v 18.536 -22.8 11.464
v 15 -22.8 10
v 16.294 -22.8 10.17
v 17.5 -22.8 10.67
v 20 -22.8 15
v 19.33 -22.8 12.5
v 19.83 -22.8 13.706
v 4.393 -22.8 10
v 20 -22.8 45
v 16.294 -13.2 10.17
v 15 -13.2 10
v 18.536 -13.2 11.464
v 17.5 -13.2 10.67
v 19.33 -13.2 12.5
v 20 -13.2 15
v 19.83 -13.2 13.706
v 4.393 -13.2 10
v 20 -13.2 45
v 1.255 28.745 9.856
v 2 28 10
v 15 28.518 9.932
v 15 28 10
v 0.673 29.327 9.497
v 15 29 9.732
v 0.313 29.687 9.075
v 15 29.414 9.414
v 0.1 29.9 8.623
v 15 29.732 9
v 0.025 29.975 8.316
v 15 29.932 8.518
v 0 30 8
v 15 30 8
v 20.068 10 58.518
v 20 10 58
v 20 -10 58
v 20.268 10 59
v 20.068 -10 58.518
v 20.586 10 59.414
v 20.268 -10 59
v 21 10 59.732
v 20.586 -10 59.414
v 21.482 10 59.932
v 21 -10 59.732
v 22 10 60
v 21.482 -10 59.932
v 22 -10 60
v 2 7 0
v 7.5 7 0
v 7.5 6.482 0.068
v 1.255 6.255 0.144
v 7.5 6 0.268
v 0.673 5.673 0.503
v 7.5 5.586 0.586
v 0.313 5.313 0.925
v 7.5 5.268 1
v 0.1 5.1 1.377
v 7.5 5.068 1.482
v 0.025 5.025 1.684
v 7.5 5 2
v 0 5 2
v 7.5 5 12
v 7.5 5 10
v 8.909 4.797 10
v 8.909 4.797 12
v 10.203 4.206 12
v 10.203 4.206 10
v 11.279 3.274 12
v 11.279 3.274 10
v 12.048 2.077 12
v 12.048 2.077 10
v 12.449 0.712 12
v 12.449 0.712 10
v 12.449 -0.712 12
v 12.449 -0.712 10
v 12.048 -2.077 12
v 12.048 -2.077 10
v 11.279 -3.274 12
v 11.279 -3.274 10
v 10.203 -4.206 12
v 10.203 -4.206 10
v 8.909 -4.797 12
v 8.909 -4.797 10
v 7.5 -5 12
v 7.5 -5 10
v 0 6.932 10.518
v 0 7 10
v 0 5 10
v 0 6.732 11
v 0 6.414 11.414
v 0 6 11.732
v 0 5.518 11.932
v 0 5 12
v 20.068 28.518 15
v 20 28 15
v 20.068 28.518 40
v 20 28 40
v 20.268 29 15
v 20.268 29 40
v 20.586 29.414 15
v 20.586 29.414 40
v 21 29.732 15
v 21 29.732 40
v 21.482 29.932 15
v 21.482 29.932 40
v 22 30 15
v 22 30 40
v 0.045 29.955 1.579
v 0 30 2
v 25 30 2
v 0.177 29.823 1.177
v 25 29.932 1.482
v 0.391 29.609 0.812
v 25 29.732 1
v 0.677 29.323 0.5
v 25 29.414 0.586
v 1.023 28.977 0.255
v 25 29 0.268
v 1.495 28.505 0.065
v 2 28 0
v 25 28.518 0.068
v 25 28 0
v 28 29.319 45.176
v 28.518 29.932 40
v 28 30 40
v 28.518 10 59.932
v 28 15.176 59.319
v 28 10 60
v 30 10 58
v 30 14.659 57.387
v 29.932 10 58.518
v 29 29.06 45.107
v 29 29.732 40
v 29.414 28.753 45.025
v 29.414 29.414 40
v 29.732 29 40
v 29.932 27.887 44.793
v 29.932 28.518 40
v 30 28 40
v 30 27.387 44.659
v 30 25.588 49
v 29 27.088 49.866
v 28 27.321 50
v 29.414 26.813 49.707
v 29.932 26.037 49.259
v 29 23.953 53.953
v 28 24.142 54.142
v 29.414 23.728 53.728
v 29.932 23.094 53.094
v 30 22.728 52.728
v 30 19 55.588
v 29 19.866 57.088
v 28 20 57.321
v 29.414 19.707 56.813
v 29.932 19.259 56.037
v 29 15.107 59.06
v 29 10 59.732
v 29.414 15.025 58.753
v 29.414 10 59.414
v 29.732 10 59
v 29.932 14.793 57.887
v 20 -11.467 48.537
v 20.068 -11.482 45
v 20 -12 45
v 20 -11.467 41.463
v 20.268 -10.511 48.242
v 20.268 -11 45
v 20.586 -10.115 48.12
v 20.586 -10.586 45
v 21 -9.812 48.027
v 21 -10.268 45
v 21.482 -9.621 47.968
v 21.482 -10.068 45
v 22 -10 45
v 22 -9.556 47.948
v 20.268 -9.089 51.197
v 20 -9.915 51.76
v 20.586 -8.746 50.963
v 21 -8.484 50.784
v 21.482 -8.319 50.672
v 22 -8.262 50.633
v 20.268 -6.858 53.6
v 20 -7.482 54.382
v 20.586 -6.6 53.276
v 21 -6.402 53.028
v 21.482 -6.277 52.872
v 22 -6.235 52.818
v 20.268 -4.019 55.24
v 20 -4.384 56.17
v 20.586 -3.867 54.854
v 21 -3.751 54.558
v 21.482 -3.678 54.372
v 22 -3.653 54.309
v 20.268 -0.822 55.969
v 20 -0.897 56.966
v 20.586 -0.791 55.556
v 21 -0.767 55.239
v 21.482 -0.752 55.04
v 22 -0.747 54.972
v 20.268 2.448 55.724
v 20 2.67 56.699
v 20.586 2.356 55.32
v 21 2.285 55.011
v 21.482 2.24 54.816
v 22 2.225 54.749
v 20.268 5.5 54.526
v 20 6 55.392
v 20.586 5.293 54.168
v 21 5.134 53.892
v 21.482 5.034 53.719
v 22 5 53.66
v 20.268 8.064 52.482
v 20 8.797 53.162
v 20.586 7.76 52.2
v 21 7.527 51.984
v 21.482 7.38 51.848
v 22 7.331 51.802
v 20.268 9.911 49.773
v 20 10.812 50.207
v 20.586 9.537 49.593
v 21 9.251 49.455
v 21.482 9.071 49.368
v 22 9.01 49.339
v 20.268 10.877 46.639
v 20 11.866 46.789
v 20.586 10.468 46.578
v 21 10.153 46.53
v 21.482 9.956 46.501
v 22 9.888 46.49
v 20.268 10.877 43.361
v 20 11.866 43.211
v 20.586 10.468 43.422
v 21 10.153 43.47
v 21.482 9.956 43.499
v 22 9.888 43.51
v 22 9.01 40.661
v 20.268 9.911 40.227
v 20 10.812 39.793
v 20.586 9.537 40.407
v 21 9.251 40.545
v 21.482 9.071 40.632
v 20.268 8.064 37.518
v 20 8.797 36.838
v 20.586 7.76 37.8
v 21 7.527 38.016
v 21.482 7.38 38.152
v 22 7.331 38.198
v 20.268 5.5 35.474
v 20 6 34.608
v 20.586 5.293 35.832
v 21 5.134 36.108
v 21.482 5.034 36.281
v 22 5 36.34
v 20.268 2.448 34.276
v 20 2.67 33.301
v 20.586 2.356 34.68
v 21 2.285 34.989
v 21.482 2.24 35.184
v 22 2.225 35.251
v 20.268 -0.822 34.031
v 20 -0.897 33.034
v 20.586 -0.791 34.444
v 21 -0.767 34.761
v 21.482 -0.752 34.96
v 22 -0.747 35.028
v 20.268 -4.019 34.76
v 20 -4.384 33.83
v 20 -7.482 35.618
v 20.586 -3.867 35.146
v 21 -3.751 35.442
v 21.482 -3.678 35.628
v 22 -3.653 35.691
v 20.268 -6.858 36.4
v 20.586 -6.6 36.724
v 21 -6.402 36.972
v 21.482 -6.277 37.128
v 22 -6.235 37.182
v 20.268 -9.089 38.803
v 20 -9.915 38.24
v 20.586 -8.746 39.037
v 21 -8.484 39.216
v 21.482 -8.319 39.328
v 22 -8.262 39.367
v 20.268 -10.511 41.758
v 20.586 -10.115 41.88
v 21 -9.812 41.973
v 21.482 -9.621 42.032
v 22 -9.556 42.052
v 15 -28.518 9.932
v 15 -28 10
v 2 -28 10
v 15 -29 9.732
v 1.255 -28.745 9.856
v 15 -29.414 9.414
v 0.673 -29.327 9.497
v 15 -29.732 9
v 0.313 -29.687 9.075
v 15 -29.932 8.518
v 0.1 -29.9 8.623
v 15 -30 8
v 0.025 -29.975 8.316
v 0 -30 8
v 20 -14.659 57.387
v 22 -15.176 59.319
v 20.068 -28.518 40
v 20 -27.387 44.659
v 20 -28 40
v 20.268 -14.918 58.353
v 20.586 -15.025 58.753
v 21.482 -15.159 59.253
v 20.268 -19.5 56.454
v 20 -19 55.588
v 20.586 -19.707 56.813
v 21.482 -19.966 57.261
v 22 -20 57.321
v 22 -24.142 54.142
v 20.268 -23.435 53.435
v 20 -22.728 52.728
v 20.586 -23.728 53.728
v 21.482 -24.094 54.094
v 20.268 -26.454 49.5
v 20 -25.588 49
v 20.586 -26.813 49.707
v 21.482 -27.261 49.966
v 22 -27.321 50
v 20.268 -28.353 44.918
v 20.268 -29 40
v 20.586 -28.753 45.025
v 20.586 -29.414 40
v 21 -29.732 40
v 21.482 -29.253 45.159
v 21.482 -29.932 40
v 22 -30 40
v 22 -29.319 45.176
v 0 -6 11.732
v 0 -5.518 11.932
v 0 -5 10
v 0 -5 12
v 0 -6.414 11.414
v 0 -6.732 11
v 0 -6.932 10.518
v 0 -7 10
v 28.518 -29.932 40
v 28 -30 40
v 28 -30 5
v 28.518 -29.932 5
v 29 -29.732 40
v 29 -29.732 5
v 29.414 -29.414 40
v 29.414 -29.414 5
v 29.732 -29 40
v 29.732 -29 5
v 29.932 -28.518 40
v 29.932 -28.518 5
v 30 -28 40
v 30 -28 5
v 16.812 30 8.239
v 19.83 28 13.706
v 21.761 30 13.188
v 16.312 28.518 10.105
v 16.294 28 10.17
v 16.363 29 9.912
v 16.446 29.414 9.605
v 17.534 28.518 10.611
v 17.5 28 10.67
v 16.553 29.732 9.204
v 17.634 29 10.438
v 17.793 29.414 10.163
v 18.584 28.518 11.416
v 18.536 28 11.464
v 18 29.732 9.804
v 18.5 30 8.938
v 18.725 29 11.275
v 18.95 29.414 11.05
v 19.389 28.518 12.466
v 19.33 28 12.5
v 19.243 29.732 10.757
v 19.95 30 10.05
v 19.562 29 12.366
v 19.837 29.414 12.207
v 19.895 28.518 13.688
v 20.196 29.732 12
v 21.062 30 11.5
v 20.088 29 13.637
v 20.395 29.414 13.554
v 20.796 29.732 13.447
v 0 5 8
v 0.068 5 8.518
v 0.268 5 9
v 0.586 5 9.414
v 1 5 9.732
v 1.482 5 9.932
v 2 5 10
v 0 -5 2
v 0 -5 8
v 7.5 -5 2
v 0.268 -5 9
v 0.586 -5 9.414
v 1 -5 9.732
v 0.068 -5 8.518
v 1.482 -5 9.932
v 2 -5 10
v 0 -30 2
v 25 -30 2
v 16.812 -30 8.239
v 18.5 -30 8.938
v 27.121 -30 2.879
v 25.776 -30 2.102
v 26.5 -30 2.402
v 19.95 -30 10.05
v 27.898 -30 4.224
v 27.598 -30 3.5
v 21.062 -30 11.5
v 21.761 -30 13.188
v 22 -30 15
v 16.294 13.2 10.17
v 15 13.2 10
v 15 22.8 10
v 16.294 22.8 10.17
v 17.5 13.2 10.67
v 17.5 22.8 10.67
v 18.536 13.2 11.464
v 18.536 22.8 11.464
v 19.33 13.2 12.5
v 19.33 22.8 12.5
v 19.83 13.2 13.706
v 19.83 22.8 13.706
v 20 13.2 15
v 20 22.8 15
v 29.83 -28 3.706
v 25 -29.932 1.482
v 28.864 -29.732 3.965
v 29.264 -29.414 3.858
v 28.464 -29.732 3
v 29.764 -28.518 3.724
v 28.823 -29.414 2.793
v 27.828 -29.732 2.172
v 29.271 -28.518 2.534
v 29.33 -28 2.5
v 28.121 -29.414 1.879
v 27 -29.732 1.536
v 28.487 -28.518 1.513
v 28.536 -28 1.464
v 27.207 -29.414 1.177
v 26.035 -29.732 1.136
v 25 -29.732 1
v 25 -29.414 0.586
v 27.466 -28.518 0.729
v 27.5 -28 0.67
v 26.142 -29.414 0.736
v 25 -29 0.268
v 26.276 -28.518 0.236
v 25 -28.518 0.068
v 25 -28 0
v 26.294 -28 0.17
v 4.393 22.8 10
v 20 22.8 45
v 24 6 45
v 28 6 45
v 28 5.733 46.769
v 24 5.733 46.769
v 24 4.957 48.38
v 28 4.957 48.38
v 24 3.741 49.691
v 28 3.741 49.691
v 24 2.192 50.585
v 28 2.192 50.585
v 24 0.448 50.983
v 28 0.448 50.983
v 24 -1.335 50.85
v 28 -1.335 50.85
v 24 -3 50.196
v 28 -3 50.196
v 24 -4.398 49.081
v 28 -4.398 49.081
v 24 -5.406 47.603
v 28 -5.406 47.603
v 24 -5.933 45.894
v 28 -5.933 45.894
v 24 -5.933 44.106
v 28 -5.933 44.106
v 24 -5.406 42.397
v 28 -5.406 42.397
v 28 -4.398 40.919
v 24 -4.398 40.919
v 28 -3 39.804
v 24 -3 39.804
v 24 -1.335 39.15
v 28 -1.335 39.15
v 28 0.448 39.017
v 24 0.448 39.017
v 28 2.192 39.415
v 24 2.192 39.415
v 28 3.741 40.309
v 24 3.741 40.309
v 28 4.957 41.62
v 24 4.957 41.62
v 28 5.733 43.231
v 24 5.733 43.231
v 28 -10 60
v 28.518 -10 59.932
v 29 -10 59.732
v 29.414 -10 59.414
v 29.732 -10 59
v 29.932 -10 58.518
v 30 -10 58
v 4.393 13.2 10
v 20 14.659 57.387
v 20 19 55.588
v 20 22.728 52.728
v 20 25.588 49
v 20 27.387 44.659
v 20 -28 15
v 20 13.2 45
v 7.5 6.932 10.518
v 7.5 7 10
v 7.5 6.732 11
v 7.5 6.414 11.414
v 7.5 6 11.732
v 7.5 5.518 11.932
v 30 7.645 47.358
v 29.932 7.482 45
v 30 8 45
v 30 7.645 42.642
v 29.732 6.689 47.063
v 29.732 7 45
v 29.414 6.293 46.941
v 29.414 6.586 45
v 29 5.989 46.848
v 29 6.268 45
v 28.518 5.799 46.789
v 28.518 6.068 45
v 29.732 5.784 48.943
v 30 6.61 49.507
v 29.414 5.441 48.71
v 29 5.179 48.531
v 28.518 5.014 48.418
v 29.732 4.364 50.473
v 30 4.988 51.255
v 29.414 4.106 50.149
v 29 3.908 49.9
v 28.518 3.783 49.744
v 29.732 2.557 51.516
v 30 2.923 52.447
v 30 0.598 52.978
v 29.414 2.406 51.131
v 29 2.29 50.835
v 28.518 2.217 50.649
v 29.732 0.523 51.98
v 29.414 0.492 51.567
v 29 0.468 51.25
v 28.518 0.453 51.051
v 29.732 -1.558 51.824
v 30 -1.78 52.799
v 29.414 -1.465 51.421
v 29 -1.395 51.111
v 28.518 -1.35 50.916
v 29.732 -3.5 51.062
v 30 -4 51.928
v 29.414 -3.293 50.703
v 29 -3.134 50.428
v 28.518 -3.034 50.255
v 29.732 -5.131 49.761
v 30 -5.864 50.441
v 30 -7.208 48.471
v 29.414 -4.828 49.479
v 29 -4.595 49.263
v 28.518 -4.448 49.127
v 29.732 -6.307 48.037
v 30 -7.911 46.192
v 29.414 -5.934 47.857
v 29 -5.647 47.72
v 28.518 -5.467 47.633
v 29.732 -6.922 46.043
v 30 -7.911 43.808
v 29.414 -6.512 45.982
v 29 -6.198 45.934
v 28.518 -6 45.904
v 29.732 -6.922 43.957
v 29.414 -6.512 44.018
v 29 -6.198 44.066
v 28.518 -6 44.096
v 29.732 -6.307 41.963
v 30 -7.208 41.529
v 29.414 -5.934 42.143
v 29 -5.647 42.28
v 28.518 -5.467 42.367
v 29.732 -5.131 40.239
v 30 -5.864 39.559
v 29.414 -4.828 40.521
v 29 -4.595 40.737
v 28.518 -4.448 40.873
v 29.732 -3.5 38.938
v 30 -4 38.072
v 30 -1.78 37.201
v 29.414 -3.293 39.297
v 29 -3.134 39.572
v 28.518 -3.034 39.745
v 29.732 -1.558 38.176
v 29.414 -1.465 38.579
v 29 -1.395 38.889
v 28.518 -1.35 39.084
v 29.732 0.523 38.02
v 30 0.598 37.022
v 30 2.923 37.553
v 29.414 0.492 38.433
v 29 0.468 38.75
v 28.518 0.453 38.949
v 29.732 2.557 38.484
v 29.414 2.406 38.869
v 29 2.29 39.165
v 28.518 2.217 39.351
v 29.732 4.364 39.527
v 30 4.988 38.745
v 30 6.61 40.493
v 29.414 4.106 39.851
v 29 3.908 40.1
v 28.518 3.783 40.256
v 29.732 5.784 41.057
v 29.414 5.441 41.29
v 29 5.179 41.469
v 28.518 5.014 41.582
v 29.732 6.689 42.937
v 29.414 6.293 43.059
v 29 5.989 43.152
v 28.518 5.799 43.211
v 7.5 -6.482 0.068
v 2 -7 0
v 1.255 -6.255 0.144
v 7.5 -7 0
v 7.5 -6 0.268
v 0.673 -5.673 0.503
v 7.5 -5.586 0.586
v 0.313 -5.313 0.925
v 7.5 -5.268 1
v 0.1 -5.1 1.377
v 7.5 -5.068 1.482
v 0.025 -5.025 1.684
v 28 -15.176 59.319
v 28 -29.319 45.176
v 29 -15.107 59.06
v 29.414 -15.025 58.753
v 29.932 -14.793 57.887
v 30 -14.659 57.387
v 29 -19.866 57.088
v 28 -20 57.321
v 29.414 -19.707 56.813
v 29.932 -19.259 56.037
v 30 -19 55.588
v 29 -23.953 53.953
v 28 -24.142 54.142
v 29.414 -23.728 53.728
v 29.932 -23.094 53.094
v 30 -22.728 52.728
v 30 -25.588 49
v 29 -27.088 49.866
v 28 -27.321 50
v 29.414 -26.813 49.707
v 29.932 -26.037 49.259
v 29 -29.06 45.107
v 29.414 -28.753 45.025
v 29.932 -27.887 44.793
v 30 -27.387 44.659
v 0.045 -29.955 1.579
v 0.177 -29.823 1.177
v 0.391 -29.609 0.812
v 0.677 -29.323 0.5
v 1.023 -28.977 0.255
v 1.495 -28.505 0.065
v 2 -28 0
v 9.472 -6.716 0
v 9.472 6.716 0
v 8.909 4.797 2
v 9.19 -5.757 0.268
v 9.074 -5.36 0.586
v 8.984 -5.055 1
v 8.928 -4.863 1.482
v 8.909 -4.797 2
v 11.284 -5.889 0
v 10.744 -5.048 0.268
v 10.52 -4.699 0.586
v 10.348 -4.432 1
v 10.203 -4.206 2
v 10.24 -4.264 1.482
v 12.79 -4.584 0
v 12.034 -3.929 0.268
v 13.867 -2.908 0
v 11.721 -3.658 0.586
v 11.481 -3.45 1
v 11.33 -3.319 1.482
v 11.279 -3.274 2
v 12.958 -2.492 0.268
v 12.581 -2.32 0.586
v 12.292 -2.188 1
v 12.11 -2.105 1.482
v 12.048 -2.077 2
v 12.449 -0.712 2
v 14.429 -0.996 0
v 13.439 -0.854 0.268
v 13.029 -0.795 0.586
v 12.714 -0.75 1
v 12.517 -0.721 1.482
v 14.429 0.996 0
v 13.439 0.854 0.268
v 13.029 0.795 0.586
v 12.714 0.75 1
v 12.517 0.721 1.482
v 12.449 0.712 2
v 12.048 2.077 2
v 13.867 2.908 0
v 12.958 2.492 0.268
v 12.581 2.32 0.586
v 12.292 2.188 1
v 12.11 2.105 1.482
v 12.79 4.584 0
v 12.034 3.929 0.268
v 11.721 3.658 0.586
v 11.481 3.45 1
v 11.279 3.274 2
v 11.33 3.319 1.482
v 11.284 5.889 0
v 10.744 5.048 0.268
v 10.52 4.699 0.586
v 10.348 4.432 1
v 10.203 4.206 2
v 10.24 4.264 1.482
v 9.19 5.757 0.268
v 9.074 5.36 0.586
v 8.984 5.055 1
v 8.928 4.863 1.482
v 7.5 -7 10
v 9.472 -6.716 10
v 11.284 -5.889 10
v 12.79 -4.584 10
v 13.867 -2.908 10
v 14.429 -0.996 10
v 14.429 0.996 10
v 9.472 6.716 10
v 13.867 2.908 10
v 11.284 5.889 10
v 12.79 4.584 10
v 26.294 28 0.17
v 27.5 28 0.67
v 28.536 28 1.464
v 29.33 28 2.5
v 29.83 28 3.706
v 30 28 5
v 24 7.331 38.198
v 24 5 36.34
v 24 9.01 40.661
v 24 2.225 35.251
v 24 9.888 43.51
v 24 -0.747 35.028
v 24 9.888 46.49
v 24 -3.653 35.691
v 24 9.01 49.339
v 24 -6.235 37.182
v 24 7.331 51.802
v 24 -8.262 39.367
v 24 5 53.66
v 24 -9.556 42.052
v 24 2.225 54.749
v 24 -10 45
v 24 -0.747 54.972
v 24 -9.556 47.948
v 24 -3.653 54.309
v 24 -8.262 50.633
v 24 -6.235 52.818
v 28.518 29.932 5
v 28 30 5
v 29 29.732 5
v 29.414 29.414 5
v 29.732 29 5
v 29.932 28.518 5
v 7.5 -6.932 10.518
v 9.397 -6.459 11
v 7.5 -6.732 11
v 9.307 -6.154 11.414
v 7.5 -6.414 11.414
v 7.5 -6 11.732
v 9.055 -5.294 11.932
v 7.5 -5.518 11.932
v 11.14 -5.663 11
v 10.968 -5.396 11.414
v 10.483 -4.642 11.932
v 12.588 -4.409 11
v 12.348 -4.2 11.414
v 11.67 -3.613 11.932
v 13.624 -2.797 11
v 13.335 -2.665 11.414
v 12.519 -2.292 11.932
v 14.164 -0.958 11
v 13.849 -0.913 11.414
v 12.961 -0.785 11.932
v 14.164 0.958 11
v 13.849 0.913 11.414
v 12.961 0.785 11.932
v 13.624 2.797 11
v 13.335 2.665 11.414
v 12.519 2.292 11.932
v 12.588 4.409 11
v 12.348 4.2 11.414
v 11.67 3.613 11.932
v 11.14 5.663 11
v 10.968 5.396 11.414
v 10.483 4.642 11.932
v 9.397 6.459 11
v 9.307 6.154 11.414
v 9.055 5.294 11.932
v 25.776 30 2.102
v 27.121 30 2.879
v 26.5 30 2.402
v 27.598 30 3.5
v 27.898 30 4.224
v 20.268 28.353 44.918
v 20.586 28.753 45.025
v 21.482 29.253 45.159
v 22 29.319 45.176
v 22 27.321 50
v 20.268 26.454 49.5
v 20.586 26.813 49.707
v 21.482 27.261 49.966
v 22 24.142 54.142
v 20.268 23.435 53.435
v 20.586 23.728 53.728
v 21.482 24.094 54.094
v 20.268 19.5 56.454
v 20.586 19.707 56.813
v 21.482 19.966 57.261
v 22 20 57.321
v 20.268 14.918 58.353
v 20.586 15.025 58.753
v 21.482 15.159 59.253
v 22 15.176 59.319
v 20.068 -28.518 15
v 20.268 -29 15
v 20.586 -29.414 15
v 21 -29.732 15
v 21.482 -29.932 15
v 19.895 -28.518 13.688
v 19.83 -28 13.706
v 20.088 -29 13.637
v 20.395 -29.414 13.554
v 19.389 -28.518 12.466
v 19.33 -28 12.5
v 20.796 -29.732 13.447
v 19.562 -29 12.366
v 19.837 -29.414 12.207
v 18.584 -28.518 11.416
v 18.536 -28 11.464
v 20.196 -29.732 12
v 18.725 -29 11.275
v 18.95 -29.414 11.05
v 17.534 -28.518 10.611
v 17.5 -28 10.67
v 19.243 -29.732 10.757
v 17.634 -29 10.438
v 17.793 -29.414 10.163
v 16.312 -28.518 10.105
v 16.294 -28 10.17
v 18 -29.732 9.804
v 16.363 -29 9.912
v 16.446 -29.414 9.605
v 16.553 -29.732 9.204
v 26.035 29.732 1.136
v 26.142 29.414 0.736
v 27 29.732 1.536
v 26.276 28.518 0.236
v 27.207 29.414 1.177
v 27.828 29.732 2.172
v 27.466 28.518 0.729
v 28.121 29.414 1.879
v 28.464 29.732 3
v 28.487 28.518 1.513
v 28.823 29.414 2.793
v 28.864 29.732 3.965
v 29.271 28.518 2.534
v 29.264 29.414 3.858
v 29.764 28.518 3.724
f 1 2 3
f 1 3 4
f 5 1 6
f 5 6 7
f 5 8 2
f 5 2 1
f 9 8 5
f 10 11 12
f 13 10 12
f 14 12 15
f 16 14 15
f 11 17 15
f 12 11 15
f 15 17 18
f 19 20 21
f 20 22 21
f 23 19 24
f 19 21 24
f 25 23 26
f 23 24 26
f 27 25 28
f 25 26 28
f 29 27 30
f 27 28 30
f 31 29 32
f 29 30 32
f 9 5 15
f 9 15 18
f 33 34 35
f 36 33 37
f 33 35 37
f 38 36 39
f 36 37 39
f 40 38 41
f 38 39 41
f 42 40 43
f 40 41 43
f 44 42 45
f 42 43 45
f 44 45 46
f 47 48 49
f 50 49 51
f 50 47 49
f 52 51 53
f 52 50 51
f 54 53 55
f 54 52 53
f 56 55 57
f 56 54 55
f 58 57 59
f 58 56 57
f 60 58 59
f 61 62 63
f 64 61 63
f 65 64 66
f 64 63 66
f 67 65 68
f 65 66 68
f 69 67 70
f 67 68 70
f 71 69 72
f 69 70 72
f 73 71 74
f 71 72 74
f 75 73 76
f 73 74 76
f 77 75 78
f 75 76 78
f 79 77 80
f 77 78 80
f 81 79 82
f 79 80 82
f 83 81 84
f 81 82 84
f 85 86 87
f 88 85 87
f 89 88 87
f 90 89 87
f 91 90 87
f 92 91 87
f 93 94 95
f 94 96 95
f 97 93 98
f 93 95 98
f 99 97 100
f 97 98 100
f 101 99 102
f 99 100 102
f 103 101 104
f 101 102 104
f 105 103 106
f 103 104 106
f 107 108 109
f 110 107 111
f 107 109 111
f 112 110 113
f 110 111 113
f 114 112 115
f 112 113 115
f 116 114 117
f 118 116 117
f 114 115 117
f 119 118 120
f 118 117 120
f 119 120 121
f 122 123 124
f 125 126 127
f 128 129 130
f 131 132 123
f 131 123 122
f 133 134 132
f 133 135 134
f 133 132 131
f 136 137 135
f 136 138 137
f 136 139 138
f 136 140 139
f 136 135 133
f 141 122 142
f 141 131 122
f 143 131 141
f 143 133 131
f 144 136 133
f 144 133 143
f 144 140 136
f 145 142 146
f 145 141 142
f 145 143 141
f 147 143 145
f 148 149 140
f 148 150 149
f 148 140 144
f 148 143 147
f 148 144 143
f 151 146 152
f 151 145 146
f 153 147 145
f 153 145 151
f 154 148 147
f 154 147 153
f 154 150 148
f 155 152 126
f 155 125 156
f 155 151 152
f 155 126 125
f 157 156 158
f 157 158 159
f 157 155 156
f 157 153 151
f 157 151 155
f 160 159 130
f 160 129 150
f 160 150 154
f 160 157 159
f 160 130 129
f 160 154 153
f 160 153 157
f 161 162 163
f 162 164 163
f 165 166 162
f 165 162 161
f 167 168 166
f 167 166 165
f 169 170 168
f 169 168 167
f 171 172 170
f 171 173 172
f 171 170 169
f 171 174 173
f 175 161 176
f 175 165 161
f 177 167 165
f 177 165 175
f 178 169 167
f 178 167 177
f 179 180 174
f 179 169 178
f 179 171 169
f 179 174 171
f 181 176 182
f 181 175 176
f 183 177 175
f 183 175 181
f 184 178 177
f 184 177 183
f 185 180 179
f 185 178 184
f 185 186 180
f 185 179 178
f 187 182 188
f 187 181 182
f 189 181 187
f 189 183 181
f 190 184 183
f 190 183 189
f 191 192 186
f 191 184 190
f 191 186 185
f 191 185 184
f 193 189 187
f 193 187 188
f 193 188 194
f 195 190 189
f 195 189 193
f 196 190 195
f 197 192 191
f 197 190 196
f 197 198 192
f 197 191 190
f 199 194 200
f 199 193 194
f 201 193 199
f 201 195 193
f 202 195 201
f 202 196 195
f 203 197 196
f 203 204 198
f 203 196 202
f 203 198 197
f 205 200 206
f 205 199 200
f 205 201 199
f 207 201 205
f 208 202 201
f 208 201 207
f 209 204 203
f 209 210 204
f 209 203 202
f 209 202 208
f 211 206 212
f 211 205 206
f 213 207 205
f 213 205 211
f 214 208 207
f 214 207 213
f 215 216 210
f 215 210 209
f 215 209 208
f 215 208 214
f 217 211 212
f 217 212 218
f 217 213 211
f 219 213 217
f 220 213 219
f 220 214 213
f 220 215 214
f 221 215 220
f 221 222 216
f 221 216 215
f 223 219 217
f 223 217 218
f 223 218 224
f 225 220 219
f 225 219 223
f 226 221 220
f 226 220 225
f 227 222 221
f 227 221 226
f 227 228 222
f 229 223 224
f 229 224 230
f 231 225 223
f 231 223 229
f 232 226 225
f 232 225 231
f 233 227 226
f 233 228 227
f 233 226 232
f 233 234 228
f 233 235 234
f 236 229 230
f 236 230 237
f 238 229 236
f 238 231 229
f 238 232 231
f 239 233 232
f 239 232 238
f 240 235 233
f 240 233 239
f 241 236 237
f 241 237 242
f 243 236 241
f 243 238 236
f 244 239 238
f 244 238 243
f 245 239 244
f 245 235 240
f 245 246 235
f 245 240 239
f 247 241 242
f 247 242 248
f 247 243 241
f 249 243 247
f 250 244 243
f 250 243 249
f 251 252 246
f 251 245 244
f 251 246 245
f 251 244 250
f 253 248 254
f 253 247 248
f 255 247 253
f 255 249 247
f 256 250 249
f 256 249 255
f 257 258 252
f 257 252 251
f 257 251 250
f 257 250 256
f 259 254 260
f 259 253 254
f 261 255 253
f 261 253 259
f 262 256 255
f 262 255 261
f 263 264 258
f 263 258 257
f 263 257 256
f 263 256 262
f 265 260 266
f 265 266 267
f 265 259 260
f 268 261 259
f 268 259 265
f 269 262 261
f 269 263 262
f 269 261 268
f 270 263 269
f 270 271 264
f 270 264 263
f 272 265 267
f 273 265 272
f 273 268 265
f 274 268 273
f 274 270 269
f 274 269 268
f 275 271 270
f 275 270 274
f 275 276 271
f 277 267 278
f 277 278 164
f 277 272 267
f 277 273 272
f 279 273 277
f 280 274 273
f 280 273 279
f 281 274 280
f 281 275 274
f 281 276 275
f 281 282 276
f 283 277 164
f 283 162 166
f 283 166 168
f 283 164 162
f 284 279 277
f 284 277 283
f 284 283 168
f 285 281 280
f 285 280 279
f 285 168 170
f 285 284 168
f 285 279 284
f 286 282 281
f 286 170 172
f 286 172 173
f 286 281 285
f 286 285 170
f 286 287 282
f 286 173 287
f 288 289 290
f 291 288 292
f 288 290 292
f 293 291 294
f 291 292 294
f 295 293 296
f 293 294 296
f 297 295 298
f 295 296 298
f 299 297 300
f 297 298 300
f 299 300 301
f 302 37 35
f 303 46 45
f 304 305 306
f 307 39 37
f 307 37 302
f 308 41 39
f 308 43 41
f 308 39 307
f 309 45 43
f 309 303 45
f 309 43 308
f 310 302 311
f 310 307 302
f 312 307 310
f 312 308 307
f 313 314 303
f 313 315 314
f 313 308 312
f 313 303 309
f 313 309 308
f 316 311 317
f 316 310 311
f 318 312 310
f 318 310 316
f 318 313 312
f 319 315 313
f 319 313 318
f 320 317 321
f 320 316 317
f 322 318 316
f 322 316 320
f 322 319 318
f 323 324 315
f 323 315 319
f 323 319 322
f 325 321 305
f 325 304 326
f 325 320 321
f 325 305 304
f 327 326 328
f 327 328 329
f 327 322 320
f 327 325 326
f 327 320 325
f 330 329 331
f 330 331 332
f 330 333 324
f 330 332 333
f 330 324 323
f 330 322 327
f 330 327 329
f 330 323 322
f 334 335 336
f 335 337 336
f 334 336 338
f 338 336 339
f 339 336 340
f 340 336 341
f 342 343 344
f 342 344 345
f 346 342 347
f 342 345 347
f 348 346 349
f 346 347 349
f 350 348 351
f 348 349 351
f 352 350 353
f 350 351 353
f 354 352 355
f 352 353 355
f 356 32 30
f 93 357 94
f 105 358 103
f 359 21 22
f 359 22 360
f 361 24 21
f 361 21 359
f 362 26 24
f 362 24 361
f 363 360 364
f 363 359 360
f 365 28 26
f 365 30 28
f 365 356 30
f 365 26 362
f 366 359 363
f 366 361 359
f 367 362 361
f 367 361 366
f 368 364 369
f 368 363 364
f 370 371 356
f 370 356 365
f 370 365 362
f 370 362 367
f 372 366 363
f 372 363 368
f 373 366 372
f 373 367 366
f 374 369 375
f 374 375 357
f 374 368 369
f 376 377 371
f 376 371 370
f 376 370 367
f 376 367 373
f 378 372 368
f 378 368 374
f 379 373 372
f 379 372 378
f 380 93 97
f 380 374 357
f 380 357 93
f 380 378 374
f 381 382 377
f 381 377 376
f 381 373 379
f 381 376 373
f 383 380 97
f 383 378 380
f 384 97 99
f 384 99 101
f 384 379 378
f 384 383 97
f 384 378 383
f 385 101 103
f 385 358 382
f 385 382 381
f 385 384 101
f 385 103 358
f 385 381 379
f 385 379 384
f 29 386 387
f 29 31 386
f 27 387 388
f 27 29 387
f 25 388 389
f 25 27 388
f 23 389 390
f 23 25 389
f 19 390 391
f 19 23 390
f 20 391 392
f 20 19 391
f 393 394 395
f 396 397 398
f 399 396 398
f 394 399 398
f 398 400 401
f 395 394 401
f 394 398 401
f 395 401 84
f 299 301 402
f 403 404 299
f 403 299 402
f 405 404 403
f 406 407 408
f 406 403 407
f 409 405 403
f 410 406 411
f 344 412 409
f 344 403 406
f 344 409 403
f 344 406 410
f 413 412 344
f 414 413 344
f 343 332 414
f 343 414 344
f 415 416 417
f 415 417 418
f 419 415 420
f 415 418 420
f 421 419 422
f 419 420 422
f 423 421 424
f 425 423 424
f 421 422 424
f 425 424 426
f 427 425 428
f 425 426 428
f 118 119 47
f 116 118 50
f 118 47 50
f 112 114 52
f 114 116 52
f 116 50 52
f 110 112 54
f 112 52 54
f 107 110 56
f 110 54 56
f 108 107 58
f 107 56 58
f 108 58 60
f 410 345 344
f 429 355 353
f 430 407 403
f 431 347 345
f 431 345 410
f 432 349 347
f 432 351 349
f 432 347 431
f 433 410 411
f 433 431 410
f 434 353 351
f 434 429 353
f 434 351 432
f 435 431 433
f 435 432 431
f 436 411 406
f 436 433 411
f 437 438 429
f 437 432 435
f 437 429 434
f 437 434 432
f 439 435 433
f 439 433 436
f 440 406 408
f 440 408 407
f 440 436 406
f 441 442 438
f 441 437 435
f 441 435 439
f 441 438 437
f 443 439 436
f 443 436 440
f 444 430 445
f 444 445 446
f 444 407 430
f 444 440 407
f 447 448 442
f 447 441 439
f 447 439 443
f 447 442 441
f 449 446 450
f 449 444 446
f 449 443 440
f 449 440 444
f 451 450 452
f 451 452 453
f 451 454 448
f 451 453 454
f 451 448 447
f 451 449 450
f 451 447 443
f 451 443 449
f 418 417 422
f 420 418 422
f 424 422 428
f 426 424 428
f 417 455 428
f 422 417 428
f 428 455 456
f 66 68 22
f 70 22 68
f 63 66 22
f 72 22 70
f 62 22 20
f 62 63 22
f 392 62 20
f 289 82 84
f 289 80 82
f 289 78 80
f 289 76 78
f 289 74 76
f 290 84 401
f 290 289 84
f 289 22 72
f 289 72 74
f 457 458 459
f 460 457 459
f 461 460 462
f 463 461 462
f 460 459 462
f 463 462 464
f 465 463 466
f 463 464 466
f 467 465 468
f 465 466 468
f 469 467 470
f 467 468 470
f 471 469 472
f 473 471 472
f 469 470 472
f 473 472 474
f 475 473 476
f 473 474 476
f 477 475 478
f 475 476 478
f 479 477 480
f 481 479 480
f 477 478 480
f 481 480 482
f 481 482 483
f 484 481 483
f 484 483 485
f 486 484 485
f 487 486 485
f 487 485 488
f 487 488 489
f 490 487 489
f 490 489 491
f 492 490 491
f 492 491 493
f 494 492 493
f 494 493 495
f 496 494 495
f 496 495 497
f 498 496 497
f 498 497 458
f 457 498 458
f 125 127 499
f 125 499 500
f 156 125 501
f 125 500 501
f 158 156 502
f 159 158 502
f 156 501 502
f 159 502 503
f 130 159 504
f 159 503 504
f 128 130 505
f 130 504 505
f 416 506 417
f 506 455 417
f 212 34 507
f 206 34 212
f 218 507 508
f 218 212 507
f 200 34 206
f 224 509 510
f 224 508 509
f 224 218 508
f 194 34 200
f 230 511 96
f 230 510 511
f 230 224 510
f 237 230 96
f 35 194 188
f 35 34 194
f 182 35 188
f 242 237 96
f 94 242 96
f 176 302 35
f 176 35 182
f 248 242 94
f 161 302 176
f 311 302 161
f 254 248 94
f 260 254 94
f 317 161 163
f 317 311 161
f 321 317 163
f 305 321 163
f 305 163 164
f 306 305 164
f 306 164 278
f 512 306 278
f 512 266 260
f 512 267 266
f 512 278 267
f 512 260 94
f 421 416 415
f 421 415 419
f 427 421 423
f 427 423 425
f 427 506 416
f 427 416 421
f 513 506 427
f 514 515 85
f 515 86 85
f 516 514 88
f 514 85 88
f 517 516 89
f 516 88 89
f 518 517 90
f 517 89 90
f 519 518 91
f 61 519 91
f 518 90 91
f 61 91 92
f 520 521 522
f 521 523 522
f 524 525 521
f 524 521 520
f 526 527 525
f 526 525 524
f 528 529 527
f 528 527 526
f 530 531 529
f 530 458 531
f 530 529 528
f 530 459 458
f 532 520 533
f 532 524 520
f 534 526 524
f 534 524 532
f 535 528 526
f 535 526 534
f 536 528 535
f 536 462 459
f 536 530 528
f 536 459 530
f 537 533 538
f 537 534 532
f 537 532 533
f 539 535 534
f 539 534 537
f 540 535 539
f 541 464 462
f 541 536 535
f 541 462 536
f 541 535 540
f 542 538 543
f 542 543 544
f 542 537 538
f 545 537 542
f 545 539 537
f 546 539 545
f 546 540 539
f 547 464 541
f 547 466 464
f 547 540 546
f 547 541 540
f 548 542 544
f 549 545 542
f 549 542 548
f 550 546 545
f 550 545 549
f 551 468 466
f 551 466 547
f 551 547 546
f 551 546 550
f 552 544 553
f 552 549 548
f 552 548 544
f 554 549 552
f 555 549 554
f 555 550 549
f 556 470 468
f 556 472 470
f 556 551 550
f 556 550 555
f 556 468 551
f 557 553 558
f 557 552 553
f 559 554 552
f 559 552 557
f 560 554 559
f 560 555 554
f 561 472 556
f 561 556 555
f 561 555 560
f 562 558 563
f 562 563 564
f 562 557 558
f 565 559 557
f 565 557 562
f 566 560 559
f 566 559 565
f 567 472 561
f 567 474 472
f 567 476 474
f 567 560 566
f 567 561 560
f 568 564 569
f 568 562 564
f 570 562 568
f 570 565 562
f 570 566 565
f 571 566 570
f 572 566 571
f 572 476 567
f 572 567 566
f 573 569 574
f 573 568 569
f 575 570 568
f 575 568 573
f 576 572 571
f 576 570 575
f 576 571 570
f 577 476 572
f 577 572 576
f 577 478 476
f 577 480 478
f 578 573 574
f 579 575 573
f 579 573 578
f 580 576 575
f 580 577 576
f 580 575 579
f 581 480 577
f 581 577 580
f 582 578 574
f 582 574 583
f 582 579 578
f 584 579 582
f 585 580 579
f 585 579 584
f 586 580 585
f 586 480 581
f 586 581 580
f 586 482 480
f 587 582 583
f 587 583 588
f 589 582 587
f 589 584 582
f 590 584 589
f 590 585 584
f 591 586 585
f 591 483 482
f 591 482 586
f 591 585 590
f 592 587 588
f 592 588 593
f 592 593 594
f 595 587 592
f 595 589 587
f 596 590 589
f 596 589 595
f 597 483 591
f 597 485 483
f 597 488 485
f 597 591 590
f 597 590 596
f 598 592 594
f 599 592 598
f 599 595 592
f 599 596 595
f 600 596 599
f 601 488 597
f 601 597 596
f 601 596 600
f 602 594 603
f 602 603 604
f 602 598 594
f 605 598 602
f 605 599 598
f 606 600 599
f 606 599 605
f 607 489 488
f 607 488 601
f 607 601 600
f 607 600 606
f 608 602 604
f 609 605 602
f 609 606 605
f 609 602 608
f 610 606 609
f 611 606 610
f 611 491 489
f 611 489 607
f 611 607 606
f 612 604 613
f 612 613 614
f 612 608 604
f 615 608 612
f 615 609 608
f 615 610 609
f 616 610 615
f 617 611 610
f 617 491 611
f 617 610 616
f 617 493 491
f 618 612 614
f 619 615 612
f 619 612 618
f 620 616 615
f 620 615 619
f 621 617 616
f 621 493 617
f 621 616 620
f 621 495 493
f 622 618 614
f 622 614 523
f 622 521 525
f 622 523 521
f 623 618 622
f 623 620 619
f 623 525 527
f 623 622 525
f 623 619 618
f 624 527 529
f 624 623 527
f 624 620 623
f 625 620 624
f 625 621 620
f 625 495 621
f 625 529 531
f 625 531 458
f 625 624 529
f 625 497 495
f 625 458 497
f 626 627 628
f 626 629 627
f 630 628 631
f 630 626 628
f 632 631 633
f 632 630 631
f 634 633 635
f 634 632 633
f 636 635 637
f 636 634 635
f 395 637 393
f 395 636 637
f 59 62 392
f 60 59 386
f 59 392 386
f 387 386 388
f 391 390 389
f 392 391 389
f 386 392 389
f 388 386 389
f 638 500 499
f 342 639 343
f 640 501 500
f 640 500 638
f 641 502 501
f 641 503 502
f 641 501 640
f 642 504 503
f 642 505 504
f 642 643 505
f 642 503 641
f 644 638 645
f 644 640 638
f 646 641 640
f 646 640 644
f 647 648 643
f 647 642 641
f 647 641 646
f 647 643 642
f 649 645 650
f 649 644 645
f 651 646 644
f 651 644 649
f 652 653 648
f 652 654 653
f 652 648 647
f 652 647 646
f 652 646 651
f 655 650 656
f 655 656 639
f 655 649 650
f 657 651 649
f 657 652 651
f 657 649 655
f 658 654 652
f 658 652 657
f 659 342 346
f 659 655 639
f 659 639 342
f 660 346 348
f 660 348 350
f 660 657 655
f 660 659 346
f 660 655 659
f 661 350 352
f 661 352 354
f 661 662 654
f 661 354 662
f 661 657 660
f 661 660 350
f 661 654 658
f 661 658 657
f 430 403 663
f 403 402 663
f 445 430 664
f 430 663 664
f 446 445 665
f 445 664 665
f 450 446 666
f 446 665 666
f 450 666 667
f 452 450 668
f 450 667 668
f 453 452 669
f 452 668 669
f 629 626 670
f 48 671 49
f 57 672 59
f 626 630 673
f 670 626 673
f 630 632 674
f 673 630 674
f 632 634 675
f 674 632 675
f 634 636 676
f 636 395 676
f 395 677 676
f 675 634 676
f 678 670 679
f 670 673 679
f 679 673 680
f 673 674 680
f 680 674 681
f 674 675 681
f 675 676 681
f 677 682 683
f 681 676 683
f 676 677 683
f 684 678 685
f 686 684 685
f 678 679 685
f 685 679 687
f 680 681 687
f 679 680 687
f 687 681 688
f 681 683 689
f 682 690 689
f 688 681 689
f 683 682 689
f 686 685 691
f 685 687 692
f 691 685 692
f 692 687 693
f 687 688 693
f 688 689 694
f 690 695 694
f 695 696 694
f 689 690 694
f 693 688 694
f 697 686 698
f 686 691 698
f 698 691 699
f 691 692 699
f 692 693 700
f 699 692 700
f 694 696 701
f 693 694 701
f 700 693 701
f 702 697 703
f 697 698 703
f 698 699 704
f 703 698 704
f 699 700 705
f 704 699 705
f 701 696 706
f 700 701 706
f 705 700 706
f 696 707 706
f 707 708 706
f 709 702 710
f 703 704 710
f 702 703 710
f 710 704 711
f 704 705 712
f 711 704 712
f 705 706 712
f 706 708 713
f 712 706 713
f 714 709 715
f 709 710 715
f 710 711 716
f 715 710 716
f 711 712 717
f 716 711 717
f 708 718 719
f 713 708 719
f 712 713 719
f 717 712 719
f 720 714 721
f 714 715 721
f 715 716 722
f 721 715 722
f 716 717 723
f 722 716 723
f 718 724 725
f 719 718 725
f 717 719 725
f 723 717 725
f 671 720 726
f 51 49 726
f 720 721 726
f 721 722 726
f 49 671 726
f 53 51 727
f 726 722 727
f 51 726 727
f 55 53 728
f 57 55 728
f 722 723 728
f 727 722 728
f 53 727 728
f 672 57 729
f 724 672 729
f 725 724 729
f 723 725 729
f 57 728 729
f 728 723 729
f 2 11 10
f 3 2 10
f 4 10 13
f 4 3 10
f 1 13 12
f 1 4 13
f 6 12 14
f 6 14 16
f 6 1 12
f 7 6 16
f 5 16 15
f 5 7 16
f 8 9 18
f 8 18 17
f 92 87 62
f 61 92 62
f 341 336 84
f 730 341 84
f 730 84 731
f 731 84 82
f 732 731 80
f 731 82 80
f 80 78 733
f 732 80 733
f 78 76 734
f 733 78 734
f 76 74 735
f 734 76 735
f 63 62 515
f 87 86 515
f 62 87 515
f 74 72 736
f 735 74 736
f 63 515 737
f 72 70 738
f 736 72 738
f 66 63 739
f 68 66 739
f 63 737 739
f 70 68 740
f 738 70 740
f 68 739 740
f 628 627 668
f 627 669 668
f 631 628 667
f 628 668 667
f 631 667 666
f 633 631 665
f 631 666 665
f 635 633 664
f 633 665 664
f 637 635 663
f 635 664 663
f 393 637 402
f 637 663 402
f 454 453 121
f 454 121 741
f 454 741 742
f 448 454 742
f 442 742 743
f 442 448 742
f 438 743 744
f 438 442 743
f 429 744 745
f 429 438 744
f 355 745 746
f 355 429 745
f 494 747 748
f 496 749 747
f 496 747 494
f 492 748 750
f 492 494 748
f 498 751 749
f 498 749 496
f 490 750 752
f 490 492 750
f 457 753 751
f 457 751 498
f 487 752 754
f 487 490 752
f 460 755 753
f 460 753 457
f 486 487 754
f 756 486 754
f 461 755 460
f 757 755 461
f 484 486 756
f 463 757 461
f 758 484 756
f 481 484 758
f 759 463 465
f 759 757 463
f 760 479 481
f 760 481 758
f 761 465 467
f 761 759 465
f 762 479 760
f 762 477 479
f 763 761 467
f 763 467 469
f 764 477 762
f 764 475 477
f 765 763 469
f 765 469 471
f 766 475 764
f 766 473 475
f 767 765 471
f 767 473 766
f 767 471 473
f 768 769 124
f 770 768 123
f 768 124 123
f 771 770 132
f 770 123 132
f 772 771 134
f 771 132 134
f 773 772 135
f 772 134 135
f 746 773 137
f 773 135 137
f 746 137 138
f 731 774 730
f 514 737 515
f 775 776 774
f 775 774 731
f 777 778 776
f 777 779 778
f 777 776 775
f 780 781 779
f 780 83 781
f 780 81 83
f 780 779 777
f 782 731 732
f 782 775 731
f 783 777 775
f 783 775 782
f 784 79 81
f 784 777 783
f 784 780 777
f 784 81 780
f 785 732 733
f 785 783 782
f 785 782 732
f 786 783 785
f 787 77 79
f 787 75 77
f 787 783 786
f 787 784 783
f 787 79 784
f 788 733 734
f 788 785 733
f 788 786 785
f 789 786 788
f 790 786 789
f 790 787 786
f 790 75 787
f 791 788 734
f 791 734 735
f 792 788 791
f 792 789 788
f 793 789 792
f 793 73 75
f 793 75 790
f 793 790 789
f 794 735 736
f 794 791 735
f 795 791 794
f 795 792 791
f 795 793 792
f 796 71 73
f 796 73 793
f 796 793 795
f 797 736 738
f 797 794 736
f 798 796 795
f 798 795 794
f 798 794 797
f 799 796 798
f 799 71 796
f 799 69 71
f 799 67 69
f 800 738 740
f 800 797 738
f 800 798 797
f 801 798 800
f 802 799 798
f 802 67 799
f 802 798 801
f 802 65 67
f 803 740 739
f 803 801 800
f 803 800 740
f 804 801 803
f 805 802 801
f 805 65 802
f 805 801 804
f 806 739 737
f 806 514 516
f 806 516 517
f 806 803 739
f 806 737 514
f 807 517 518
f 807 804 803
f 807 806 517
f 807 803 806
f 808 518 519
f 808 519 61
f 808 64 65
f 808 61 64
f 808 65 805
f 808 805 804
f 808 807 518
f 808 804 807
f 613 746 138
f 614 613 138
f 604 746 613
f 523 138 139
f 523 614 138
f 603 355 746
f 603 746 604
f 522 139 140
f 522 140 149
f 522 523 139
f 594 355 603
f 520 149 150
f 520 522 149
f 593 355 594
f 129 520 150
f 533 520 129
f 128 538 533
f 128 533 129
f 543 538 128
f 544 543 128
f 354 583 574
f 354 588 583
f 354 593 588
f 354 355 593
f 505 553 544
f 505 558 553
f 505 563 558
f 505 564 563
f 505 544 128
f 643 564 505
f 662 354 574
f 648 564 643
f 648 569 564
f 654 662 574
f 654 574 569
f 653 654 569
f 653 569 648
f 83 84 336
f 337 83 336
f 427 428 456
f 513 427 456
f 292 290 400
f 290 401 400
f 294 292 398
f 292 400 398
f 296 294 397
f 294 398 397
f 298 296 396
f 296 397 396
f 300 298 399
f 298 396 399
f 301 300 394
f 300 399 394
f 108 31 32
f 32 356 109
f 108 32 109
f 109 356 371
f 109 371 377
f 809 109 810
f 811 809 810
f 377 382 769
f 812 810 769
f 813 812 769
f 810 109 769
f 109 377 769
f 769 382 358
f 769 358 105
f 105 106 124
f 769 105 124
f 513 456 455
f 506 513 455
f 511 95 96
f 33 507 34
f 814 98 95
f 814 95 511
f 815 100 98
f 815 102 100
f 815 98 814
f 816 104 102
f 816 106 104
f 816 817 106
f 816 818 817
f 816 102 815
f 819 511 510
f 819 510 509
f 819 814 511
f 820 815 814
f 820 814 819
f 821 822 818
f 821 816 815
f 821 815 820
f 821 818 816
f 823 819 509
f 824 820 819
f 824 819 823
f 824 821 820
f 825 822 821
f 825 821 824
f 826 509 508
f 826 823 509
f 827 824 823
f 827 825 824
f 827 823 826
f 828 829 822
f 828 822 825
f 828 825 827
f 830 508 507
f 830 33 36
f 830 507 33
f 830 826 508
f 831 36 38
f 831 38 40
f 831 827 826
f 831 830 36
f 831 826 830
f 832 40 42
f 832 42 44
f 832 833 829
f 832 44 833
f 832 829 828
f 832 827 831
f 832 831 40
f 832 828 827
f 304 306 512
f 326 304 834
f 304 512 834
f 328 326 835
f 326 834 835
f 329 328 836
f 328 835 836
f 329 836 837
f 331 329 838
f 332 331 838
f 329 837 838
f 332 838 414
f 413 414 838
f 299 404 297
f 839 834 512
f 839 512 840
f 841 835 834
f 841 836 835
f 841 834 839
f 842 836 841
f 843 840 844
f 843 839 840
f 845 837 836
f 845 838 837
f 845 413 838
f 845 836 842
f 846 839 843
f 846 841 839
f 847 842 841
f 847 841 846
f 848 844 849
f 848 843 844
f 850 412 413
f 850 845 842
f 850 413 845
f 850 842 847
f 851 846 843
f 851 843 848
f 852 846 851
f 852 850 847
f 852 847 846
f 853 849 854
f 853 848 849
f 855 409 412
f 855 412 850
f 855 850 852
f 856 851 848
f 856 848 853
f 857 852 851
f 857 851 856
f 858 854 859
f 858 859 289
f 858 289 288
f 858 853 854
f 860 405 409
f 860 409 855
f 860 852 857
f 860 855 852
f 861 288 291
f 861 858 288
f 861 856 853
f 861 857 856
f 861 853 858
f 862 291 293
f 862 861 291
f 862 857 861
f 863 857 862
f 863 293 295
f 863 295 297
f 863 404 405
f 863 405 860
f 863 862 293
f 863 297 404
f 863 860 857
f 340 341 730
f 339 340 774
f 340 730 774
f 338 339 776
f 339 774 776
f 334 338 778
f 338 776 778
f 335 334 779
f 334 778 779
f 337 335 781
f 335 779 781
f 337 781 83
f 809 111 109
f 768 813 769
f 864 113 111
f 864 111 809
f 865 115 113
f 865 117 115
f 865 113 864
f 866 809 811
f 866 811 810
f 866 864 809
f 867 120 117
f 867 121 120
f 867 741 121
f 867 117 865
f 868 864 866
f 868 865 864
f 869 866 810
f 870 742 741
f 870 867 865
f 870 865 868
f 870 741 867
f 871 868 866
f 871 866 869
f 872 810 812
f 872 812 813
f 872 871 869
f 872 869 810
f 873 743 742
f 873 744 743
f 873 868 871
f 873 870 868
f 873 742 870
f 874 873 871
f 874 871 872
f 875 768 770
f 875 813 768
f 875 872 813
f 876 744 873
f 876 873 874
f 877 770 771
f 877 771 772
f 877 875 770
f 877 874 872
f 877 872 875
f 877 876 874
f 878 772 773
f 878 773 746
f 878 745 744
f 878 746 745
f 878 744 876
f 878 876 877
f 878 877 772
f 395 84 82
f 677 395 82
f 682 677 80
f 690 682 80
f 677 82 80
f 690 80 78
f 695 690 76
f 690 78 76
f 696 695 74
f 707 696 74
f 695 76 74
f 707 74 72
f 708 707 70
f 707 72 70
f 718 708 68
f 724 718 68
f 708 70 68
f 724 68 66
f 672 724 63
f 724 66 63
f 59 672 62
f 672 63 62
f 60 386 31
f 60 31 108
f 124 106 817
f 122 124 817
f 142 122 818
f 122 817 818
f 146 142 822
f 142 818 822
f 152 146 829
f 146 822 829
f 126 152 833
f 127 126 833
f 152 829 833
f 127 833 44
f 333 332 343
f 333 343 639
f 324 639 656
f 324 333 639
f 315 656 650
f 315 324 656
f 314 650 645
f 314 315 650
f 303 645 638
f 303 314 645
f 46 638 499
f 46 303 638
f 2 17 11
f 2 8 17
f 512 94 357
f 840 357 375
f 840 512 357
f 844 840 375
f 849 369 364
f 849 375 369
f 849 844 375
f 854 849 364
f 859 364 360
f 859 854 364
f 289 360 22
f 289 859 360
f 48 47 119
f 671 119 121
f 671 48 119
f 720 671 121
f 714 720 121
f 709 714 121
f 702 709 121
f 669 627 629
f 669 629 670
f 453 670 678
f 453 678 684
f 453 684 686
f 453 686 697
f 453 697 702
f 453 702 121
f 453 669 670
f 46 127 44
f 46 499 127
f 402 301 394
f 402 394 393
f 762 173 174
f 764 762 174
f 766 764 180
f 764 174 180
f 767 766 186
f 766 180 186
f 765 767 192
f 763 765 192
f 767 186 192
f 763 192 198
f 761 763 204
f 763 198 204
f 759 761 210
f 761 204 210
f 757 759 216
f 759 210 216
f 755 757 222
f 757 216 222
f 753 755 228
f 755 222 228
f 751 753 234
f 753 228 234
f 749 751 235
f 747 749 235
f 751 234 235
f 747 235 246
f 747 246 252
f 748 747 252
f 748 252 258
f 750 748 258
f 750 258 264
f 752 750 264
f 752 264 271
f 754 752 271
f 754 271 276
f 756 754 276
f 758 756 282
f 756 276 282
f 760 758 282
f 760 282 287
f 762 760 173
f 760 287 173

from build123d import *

# Parameters (mm, degrees)
F1_DEPTH  = 30
F2_R      = 6
F3_DEPTH  = 10
F4_R      = 10
F5_DEPTH  = 4
F7_DEPTH  = 10
F10_DEPTH = 4.8
F12_DEPTH = 2
F13_R     = 20
F14_R     = 1.99999
F14_2_R   = 1.99999


# Not quite as in the source:
# - a fillet or chamfer is up to 0.001 mm smaller than in the source, because OpenCascade refuses the exact size
# - a pattern or mirror of a feature is missing from the dataset's text; its kind, count and spacing are read off the source's solid


with BuildPart() as f1:
    # F0 (on Front) → F1 (new body, symmetric)
    with BuildSketch(Plane.XZ):
        with BuildLine():
            Line((0, 10), (0, 0))
            Line((0, 0), (25, 0))
            ThreePointArc((25, 0), (28.5355339059, 1.4644660941), (30, 5))
            Line((30, 5), (30, 60))
            Line((30, 60), (20, 60))
            Line((20, 60), (20, 15))
            ThreePointArc((20, 15), (18.5355339059, 11.4644660941), (15, 10))
            Line((15, 10), (0, 10))
        make_face()
    extrude(amount=F1_DEPTH, both=True)

    # F2 (on face) → F3 (cut, through all)
    with BuildSketch(Plane.YZ.offset(30)):
        with Locations((0, 45)):
            Circle(F2_R)
    extrude(amount=-F3_DEPTH, mode=Mode.SUBTRACT)

    # F4 (on face) → F5 (cut)
    with BuildSketch(Plane(origin=(20, 0, 0), x_dir=(0, -1, 0), z_dir=(-1, 0, 0))):
        with Locations((0, 45)):
            Circle(F4_R)
    extrude(amount=-F5_DEPTH, mode=Mode.SUBTRACT)

    # F6 (on face) → F7 (cut, through all)
    with BuildSketch(Plane.XY.offset(10)):
        with BuildLine():
            Line((0, -5), (7.5000035577, -5))
            ThreePointArc((7.5000035577, -5), (12.5000035577, 0), (7.5000035577, 5))
            Line((7.5000035577, 5), (0, 5))
            Line((0, 5), (0, -5))
        make_face()
    extrude(amount=-F7_DEPTH, mode=Mode.SUBTRACT)

    # F13
    f13_edges = [f1.edges().sort_by_distance(p)[0] for p in [
        (25, 30, 60),
        (25, -30, 60),
    ]]
    fillet(f13_edges, radius=F13_R)

    # F14 (radius 2 in the source; OpenCascade refuses exactly that, so slightly less here)
    f14_edges = [f1.edges().sort_by_distance(p)[0] for p in [
        (7.5, -30, 10),
        (0, -17.5, 10),
        (0, 17.5, 10),
        (20, 30, 27.5),
        (20, 24.142136, 54.142136),
        (20, 0, 15),
        (20, 0, 60),
        (20, -30, 27.5),
        (20, -24.142136, 54.142136),
        (20, 10, 45),
        (30, 30, 22.5),
        (30, 24.142136, 54.142136),
        (30, 0, 5),
        (30, 0, 60),
        (30, -30, 22.5),
        (30, -24.142136, 54.142136),
        (30, -6, 45),
        (0, 17.5, 0),
        (3.750002, 5, 0),
        (12.500004, 0, 0),
        (3.750002, -5, 0),
        (0, -17.5, 0),
        (12.5, -30, 0),
        (25, 0, 0),
        (12.5, 30, 0),
        (28.535534, -30, 1.464466),
        (18.535534, -30, 11.464466),
        (28.535534, 30, 1.464466),
        (18.535534, 30, 11.464466),
        (7.5, 30, 10),
    ]]
    fillet(f14_edges, radius=F14_R)


with BuildPart() as f10:
    # F9 (on offset) → F10 (new body, symmetric)
    with BuildSketch(Plane.XZ.offset(18)):
        with BuildLine():
            ThreePointArc((15, 10), (18.5355339059, 11.4644660941), (20, 15))
            Line((20, 15), (20, 45))
            Line((20, 45), (4.3933112174, 10))
            Line((4.3933112174, 10), (15, 10))
        make_face()
    extrude(amount=F10_DEPTH, both=True)


with BuildPart() as f10_copies_1:
    # F10_copies: instance of F10
    add(f10.part.mirror(Plane.ZX))


with BuildPart() as f12:
    # F11 (on face) → F12 (new body)
    with BuildSketch(Plane.XY.offset(10)):
        with BuildLine():
            ThreePointArc((7.5000035577, 5), (12.5000035577, 0), (7.5000035577, -5))
            Line((7.5000035577, -5), (0, -5))
            Line((0, -5), (0, -7))
            Line((0, -7), (7.5000035577, -7))
            ThreePointArc((7.5000035577, -7), (14.5000035577, 0), (7.5000035577, 7))
            Line((7.5000035577, 7), (0, 7))
            Line((0, 7), (0, 5))
            Line((0, 5), (7.5000035577, 5))
        make_face()
    extrude(amount=F12_DEPTH)

    # F14#2 (radius 2 in the source; OpenCascade refuses exactly that, so slightly less here)
    f14_2_edges = [f12.edges().sort_by_distance(p)[0] for p in [
        (3.750002, -7, 12),
        (14.500004, 0, 12),
        (3.750002, 7, 12),
    ]]
    fillet(f14_2_edges, radius=F14_2_R)


solid = Compound([f1.part, f10.part, f10_copies_1.part, f12.part])
